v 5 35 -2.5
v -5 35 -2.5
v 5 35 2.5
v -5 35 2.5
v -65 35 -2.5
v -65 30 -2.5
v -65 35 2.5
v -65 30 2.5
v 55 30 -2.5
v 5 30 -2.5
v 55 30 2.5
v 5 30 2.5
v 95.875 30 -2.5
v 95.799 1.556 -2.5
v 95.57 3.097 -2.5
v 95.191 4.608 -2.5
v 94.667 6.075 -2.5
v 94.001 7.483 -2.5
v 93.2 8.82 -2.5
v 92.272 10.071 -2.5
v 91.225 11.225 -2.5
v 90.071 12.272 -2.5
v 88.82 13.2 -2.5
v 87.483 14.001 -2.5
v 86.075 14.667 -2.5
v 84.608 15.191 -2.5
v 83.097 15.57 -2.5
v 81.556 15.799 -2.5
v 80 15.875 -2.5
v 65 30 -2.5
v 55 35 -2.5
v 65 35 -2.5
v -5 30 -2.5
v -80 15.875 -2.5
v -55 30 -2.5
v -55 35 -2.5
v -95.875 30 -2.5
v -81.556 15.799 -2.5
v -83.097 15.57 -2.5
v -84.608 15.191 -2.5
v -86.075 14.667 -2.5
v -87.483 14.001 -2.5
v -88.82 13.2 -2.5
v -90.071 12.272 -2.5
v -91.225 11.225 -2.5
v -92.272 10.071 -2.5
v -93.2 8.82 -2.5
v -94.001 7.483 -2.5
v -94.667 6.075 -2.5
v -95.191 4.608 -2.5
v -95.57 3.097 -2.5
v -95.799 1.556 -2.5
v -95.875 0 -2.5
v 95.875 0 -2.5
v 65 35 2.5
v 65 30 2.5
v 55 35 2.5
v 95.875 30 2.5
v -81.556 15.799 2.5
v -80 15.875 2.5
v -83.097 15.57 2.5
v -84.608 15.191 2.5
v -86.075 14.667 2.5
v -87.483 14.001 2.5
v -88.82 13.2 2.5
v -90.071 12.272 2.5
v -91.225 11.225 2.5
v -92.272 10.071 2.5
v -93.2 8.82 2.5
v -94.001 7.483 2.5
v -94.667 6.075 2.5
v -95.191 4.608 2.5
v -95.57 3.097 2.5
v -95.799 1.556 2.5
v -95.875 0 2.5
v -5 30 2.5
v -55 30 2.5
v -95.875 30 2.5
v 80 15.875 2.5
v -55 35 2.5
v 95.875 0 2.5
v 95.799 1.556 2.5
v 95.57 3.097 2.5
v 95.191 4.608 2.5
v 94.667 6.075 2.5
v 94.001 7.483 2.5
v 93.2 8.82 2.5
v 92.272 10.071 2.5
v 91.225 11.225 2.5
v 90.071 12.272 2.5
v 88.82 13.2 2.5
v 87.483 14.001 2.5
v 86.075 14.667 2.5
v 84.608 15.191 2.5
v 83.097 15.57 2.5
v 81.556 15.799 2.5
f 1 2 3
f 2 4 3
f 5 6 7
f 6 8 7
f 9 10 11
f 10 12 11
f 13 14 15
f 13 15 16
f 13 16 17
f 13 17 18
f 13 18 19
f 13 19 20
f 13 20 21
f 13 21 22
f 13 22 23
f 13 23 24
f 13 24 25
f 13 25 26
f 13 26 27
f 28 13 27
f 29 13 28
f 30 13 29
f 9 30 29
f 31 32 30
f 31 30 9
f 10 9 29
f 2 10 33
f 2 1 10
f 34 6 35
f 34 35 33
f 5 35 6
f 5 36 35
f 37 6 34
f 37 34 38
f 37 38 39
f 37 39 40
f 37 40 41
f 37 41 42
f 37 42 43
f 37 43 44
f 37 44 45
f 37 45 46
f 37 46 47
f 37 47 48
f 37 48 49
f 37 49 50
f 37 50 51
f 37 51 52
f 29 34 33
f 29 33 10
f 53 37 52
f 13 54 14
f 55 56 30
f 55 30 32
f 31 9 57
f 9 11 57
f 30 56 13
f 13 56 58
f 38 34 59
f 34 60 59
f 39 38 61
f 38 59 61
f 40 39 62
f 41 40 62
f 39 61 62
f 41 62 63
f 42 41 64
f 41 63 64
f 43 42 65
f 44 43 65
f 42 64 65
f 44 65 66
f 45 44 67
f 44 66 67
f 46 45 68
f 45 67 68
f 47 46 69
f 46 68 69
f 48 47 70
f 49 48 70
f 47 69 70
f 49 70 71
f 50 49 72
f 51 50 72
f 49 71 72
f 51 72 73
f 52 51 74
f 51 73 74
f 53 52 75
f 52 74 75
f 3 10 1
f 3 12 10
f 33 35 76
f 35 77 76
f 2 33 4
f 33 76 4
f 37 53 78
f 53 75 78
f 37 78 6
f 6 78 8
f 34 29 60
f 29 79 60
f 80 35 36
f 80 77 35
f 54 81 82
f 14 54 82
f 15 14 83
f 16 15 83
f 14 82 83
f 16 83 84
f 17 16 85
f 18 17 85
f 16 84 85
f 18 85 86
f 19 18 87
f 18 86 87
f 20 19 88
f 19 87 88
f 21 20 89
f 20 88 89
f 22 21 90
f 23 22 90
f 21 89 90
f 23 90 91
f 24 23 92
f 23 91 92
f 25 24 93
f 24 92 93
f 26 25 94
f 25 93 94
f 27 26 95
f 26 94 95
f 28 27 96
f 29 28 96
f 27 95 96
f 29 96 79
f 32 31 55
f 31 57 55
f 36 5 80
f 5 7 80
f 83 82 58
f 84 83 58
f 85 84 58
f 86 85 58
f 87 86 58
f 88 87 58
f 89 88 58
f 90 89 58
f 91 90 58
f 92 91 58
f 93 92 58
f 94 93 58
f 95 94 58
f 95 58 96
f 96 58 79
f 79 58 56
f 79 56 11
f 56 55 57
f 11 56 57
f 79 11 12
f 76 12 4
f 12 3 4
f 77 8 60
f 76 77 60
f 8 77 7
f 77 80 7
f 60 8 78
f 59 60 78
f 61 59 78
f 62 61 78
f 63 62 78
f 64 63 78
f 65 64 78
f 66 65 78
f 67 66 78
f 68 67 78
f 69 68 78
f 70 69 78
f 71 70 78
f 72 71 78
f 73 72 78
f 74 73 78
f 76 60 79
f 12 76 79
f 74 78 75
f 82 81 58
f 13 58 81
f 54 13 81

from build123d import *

# Parameters (mm, degrees)
BOSS_EXTRUDE1_DEPTH = 2.5


with BuildPart() as part:
    # Sketch1 → Boss-Extrude1 (new, symmetric)
    with BuildSketch(Plane.XY):
        with BuildLine():
            ThreePointArc((-95.875, 0), (-91.225320151, 11.225320151), (-80, 15.875))
            Line((-80, 15.875), (80, 15.875))
            ThreePointArc((80, 15.875), (91.225320151, 11.225320151), (95.875, 0))
            Line((95.875, 0), (95.875, 30))
            Line((95.875, 30), (65, 30))
            Line((65, 30), (65, 35))
            Line((65, 35), (55, 35))
            Line((55, 35), (55, 30))
            Line((55, 30), (5, 30))
            Line((5, 30), (5, 35))
            Line((5, 35), (-5, 35))
            Line((-5, 35), (-5, 30))
            Line((-5, 30), (-55, 30))
            Line((-55, 30), (-55, 35))
            Line((-55, 35), (-65, 35))
            Line((-65, 35), (-65, 30))
            Line((-65, 30), (-95.875, 30))
            Line((-95.875, 30), (-95.875, 0))
        make_face()
    extrude(amount=BOSS_EXTRUDE1_DEPTH, both=True)


solid = part.part
